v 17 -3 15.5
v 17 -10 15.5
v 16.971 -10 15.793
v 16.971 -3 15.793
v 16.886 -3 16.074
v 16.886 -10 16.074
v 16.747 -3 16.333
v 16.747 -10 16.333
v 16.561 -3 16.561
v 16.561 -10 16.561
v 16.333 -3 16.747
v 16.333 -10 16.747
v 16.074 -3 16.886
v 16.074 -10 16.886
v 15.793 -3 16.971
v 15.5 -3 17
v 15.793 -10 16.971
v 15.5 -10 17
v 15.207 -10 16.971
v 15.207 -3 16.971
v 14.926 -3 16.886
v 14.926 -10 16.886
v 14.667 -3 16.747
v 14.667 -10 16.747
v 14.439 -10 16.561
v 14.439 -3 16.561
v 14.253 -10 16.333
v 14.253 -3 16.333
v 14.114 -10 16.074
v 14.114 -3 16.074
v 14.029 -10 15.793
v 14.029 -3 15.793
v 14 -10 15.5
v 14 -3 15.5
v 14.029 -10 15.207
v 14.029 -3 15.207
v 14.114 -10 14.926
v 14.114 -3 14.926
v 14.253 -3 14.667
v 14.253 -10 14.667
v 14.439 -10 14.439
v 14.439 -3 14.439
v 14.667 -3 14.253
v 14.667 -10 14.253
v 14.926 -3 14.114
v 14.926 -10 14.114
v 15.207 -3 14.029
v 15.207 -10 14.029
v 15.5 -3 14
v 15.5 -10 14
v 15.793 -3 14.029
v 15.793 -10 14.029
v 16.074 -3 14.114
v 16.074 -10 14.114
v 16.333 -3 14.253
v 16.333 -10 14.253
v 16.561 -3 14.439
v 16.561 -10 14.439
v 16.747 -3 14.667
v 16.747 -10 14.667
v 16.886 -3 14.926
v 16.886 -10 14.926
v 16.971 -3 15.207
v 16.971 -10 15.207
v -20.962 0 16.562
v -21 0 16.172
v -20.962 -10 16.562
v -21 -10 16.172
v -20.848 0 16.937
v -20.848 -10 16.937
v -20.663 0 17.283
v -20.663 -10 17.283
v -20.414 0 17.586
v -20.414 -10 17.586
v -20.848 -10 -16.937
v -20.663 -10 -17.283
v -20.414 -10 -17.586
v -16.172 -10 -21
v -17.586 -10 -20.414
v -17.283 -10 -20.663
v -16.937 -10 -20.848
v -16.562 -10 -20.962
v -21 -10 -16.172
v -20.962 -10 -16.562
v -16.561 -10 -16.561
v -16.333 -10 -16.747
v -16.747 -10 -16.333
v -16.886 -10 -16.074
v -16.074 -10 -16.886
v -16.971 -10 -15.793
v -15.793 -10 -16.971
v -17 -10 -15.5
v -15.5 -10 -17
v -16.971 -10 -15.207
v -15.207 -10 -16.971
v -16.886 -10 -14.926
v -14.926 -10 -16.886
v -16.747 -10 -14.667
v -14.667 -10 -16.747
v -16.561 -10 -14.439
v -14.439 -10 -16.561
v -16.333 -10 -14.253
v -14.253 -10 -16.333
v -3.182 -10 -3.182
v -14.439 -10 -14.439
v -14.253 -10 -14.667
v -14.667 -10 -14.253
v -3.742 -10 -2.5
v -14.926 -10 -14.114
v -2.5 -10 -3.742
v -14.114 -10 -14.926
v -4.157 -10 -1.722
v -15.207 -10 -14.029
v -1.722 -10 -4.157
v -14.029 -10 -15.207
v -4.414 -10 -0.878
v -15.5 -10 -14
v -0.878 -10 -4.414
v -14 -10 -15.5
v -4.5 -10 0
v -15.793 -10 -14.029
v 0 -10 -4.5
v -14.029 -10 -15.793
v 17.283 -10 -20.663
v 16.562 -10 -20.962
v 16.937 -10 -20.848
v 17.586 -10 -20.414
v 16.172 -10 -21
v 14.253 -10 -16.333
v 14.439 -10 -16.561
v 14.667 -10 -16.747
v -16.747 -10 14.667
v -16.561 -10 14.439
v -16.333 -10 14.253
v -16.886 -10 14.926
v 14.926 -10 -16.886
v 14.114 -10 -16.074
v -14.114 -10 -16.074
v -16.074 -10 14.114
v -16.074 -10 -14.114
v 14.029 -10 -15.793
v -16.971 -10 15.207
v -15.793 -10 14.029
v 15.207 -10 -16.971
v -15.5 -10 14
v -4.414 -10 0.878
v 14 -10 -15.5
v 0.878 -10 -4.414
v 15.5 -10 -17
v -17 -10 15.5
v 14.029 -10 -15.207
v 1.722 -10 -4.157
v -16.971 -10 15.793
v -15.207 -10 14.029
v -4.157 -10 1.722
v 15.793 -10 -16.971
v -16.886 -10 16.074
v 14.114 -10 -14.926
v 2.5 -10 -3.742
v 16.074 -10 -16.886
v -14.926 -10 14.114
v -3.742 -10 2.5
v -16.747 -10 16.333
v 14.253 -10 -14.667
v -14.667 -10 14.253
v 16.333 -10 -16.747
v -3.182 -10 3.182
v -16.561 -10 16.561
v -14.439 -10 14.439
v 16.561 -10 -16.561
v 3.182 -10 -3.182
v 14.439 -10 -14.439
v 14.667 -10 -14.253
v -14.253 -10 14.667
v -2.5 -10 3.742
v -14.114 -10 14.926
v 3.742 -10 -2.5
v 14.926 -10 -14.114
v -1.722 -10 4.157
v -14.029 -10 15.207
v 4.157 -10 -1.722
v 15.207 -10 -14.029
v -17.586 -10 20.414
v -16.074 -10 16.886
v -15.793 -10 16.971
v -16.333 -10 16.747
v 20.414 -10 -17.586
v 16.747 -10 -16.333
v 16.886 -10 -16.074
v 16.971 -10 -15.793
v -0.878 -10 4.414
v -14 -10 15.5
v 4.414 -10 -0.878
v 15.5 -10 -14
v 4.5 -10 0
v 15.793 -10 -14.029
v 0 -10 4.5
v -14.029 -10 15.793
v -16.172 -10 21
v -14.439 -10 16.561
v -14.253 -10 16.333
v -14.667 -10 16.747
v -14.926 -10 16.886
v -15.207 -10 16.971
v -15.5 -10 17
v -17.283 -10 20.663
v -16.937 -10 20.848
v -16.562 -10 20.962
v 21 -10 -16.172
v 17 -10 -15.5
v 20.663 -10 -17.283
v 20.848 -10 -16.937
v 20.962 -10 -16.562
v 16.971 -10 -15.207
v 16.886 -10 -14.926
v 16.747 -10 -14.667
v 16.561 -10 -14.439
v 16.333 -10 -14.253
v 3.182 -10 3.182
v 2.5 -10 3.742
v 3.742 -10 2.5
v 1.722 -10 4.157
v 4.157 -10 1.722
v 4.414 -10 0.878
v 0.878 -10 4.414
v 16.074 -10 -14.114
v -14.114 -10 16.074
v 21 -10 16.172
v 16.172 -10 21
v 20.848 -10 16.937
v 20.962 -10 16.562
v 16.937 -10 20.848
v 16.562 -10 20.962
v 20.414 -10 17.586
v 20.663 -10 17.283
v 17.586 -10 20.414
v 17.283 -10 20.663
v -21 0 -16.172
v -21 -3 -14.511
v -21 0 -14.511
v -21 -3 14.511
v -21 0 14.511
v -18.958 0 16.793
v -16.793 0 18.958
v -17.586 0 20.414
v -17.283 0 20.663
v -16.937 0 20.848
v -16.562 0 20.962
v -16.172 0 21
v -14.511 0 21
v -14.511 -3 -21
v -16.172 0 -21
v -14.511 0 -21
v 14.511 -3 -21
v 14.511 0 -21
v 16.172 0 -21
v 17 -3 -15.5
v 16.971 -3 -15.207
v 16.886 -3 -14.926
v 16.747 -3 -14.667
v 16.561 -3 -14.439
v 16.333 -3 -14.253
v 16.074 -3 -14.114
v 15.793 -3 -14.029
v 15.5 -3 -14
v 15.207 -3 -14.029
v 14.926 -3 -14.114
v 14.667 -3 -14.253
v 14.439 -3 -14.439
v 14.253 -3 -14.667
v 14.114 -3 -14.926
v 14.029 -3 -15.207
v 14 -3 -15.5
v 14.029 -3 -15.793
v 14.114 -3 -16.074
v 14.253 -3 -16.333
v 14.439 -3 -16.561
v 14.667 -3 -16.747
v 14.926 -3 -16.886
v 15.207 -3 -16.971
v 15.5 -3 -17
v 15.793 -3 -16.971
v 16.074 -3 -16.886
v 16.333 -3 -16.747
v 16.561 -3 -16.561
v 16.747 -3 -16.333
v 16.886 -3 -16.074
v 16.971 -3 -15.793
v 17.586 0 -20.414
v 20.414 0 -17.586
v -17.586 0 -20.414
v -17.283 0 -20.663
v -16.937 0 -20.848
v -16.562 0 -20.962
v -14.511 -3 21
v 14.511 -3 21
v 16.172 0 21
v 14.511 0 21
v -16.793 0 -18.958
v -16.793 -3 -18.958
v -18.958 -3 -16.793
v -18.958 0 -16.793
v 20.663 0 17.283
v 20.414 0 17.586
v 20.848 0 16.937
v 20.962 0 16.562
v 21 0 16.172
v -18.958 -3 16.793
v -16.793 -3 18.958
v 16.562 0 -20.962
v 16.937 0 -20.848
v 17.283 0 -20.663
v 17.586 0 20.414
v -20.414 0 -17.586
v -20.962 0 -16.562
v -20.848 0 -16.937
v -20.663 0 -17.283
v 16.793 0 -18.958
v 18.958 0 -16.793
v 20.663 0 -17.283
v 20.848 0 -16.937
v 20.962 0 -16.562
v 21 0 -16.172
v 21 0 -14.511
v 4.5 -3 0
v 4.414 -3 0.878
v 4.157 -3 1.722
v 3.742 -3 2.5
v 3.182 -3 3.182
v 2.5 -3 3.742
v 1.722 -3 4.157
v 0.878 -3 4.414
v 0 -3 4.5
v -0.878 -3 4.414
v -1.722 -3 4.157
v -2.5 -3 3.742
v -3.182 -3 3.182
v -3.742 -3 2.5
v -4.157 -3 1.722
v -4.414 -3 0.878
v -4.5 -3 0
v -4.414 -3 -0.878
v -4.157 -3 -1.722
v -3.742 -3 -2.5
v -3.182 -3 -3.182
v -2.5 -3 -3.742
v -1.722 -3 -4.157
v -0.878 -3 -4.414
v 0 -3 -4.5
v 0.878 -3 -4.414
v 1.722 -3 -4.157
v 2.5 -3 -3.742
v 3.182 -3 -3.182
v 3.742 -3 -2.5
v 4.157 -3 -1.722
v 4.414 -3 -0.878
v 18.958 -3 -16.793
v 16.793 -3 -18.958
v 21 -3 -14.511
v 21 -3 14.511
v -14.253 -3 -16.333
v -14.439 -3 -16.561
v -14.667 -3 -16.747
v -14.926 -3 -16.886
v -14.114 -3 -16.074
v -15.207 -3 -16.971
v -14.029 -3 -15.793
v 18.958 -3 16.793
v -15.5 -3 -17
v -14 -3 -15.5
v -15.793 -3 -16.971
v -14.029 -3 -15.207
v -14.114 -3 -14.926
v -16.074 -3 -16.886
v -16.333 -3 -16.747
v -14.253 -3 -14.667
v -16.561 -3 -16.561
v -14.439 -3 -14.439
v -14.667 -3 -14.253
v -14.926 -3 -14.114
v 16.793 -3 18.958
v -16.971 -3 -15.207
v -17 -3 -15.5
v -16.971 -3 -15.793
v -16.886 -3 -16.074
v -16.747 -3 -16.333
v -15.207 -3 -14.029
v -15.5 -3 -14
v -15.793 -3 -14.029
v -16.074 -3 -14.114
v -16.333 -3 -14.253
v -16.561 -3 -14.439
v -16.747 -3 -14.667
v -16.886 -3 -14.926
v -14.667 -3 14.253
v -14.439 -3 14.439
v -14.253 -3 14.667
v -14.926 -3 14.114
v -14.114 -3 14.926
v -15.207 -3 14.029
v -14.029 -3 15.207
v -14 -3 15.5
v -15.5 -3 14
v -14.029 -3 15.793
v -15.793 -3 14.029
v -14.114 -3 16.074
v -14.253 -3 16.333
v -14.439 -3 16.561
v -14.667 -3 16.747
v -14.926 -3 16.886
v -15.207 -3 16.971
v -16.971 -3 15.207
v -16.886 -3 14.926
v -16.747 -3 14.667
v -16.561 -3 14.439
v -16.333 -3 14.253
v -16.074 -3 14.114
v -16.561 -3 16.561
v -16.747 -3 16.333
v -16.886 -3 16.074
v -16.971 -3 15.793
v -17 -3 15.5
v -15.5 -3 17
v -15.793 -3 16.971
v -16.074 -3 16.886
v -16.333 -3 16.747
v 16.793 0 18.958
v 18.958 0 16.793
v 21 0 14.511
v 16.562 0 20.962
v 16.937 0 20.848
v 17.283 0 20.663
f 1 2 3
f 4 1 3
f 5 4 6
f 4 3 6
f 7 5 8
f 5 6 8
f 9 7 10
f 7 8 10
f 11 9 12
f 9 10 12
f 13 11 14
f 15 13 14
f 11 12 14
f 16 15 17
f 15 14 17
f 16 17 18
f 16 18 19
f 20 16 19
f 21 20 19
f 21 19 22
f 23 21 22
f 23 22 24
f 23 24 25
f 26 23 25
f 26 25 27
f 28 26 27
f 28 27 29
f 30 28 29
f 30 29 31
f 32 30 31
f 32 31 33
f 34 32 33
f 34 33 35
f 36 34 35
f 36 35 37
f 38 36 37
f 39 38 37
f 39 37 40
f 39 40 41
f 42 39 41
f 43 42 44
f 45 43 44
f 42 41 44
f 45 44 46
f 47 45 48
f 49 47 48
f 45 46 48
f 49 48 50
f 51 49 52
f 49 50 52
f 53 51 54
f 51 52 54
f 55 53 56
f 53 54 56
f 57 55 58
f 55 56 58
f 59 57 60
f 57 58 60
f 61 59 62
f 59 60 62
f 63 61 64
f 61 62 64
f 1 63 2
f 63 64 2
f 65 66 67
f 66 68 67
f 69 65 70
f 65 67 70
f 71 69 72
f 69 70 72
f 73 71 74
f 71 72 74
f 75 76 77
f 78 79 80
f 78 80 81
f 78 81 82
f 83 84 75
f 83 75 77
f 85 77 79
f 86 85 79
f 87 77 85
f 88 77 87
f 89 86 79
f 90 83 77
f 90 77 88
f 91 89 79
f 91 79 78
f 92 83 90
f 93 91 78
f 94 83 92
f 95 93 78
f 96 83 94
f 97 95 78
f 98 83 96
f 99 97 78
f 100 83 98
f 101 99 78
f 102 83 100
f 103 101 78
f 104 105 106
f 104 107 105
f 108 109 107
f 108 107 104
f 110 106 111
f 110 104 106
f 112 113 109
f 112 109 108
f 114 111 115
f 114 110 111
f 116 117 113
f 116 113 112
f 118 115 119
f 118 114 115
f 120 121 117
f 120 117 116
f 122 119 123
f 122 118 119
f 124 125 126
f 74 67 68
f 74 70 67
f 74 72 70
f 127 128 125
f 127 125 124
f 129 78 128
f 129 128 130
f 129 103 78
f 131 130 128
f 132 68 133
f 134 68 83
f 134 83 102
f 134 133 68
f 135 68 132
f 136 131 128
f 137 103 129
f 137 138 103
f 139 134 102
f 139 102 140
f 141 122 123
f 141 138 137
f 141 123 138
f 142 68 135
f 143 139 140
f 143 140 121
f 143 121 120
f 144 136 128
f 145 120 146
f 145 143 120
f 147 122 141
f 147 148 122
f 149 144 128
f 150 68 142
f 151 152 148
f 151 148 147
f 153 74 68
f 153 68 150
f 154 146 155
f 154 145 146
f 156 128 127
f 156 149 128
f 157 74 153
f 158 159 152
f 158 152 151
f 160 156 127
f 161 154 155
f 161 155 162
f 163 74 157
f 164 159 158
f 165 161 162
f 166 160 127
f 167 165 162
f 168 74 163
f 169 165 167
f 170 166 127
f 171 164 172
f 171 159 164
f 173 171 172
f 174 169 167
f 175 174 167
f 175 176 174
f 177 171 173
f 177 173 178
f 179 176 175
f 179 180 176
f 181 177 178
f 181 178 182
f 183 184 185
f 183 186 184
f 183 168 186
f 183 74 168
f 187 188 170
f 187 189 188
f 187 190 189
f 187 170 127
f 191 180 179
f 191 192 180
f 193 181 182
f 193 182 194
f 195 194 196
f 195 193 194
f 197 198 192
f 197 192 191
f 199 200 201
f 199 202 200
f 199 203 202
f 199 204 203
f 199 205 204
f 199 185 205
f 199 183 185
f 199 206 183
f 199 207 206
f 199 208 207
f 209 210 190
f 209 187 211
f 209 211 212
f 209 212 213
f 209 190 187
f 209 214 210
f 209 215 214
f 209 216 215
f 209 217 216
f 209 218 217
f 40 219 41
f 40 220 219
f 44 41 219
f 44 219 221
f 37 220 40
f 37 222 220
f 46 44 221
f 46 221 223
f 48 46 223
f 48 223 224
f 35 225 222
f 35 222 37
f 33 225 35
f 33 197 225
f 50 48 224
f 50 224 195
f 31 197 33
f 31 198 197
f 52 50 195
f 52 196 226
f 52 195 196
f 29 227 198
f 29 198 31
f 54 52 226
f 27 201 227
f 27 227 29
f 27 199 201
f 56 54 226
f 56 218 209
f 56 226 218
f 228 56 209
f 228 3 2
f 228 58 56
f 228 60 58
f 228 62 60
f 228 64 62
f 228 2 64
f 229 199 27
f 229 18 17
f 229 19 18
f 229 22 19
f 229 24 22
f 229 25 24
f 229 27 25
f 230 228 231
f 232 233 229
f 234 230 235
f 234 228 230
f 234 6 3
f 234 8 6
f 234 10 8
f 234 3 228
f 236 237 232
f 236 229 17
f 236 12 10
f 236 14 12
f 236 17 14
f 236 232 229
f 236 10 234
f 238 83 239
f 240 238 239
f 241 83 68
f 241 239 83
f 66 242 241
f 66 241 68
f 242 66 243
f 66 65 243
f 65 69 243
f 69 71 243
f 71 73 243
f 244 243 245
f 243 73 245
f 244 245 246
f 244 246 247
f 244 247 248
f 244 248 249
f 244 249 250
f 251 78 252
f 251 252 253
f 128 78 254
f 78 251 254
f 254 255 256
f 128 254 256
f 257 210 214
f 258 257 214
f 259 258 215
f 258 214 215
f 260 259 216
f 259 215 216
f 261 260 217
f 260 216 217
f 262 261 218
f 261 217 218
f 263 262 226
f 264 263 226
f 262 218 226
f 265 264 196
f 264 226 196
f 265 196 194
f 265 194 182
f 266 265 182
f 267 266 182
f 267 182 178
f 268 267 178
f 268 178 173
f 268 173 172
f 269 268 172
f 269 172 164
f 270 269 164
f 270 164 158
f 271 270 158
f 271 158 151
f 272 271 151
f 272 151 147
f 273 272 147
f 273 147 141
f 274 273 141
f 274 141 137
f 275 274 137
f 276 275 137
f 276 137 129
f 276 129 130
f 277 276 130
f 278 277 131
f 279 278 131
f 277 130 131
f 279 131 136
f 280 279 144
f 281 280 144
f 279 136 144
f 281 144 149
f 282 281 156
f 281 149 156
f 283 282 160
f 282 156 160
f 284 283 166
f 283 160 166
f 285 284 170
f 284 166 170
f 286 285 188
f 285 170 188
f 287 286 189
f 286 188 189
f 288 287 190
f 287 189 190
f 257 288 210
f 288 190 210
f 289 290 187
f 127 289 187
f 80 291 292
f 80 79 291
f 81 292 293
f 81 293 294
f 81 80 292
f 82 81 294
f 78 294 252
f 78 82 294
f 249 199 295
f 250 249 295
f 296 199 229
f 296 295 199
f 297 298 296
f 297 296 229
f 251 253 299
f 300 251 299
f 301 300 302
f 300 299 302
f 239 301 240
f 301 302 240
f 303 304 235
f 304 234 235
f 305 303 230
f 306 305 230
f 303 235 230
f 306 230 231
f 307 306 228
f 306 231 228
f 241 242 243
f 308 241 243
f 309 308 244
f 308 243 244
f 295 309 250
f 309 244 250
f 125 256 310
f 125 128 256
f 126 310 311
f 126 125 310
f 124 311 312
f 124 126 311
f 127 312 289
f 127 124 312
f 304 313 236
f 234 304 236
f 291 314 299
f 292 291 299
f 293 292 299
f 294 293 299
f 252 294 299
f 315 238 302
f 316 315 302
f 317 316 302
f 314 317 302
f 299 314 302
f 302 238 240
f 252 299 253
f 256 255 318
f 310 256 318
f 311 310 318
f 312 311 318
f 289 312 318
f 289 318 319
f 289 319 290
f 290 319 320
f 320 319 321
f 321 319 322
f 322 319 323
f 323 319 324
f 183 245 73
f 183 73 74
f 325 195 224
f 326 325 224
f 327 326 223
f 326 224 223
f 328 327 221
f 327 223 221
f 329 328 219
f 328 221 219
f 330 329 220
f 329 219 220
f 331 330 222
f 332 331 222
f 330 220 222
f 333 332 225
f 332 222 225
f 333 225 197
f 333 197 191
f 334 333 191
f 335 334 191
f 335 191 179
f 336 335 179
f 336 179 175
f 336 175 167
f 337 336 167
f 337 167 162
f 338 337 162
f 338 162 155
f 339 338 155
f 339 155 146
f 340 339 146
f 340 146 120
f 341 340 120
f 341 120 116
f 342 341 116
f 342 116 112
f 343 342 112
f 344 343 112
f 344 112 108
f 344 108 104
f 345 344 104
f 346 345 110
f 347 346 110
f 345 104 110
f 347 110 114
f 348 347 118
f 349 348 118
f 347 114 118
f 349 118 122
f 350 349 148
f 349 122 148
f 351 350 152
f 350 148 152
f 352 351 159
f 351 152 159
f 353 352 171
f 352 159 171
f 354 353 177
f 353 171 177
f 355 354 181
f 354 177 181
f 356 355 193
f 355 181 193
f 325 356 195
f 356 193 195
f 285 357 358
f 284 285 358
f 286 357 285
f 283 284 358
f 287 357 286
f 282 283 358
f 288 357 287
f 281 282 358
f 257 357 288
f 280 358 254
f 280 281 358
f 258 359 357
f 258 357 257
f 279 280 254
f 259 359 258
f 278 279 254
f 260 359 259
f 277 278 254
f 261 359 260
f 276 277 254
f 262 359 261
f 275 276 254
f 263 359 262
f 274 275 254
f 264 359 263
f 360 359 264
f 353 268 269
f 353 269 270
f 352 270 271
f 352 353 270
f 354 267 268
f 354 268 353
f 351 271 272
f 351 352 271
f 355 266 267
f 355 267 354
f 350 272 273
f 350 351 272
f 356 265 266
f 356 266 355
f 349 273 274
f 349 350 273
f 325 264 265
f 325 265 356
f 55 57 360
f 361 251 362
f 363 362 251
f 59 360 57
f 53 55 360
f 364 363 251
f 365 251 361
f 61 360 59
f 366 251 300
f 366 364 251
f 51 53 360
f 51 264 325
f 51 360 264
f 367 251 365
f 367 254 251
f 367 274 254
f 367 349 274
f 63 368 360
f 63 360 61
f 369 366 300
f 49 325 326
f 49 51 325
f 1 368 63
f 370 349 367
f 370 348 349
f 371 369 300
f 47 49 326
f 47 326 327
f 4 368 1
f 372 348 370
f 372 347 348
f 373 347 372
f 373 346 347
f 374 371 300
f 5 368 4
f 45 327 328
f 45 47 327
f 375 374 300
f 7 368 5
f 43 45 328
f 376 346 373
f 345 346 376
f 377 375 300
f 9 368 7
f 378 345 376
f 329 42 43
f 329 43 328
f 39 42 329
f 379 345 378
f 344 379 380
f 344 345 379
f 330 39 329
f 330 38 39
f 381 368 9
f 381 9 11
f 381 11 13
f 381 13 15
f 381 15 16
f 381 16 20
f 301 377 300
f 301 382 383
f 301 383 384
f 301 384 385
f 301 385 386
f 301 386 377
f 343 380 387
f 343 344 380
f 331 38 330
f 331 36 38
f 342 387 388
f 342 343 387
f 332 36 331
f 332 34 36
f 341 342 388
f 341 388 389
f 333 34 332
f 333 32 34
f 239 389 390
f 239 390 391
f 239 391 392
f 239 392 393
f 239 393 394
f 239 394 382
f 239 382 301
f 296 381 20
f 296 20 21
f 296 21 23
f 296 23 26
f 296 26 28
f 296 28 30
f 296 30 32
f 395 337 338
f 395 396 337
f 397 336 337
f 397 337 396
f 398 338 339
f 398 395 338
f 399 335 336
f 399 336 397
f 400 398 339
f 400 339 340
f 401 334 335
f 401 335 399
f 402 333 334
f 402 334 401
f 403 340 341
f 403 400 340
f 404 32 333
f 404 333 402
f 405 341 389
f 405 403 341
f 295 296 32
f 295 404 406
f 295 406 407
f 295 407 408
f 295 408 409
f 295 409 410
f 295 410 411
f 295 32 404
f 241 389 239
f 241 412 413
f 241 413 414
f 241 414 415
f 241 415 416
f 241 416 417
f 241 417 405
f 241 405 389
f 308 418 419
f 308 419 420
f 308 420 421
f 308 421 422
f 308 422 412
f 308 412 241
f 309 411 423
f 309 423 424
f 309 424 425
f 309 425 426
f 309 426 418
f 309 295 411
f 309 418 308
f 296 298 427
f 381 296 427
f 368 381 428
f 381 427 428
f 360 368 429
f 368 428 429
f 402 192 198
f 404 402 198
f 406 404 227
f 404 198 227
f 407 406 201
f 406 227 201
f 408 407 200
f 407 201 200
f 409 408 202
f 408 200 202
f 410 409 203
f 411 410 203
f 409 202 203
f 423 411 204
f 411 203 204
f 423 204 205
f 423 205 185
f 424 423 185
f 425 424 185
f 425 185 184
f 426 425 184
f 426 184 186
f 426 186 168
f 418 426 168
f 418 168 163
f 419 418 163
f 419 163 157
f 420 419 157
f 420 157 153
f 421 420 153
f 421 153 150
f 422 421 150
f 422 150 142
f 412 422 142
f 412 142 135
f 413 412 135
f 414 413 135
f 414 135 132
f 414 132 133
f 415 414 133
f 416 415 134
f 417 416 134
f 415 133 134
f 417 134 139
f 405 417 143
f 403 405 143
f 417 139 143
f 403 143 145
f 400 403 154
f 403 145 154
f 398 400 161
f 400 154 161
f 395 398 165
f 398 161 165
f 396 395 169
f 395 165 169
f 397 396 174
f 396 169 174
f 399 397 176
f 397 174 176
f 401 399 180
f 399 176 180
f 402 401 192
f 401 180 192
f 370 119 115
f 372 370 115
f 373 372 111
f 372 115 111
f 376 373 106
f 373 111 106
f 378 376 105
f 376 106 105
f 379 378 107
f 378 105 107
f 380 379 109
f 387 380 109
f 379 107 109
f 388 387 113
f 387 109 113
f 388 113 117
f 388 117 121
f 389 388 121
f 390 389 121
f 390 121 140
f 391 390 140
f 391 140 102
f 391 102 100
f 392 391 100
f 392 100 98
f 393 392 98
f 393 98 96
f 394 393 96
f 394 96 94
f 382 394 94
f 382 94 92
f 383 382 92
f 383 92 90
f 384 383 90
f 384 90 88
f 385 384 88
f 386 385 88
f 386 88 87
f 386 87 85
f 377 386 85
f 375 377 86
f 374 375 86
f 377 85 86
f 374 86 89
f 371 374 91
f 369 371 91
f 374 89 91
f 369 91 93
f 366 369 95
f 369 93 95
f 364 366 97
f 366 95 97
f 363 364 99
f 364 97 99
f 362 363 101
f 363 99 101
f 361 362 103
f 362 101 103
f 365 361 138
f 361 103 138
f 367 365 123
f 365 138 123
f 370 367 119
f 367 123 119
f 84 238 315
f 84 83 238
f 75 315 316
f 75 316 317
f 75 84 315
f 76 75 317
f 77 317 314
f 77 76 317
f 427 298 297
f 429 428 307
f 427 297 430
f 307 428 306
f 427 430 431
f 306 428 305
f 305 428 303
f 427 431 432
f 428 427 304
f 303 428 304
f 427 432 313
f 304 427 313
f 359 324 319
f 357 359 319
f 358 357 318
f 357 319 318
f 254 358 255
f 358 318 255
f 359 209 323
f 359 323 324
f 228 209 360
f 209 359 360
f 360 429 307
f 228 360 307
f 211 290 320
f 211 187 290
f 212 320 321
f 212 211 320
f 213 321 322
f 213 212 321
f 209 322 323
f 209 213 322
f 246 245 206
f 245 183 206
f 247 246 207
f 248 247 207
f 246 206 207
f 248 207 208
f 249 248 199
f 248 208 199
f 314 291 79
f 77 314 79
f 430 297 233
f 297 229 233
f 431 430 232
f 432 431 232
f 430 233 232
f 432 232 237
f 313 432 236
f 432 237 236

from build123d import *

# Parameters (mm, degrees)
F0_W     = 42
F0_H     = 42
F1_DEPTH = 10
F2_SIZE  = 4
F3_R     = 2
F5_DEPTH = 3
F6_R     = 1.5
F7_DEPTH = 10.001
F8_R     = 4.5
F9_DEPTH = 10.001


with BuildPart() as f1:
    # F0 (on Front) → F1 (new body)
    with BuildSketch(Plane.XZ):
        Rectangle(F0_W, F0_H)
    extrude(amount=F1_DEPTH)

    # F2
    f2_edges = [f1.edges().sort_by_distance(p)[0] for p in [
        (-21, -5, 21),
        (21, -5, 21),
        (21, -5, -21),
        (-21, -5, -21),
    ]]
    chamfer(f2_edges, length=F2_SIZE)

    # F3
    f3_edges = [f1.edges().sort_by_distance(p)[0] for p in [
        (-17, -5, 21),
        (17, -5, 21),
        (21, -5, 17),
        (21, -5, -17),
        (17, -5, -21),
        (-17, -5, -21),
        (-21, -5, -17),
        (-21, -5, 17),
    ]]
    fillet(f3_edges, radius=F3_R)

    # F4 (on face) → F5 (cut)
    with BuildSketch(Plane(origin=(0, 0, 0), x_dir=(-1, 0, 0), z_dir=(0, 1, 0))):
        with BuildLine():
            ThreePointArc((-14.5105618091, 21), (-17.8908729653, 17.8908729653), (-21, 14.5105618091))
            Line((-21, 14.5105618091), (-21, -14.5105618091))
            ThreePointArc((-21, -14.5105618091), (-17.8908729653, -17.8908729653), (-14.5105618091, -21))
            Line((-14.5105618091, -21), (14.5105618091, -21))
            ThreePointArc((14.5105618091, -21), (17.8908729653, -17.8908729653), (21, -14.5105618091))
            Line((21, -14.5105618091), (21, 14.5105618091))
            ThreePointArc((21, 14.5105618091), (17.8908729653, 17.8908729653), (14.5105618091, 21))
            Line((14.5105618091, 21), (-14.5105618091, 21))
        make_face()
    extrude(amount=-F5_DEPTH, mode=Mode.SUBTRACT)

    # F6 (on face) → F7 (cut, through all)
    with BuildSketch(Plane.XZ.offset(10)):
        with Locations((-15.5, 15.5)):
            Circle(F6_R)
        with Locations((-15.5, -15.5)):
            Circle(F6_R)
        with Locations((15.5, -15.5)):
            Circle(F6_R)
        with Locations((15.5, 15.5)):
            Circle(F6_R)
    extrude(amount=-F7_DEPTH, mode=Mode.SUBTRACT)

    # F8 (on face) → F9 (cut, through all)
    with BuildSketch(Plane.XZ.offset(10)):
        Circle(F8_R)
    extrude(amount=-F9_DEPTH, mode=Mode.SUBTRACT)


solid = f1.part
